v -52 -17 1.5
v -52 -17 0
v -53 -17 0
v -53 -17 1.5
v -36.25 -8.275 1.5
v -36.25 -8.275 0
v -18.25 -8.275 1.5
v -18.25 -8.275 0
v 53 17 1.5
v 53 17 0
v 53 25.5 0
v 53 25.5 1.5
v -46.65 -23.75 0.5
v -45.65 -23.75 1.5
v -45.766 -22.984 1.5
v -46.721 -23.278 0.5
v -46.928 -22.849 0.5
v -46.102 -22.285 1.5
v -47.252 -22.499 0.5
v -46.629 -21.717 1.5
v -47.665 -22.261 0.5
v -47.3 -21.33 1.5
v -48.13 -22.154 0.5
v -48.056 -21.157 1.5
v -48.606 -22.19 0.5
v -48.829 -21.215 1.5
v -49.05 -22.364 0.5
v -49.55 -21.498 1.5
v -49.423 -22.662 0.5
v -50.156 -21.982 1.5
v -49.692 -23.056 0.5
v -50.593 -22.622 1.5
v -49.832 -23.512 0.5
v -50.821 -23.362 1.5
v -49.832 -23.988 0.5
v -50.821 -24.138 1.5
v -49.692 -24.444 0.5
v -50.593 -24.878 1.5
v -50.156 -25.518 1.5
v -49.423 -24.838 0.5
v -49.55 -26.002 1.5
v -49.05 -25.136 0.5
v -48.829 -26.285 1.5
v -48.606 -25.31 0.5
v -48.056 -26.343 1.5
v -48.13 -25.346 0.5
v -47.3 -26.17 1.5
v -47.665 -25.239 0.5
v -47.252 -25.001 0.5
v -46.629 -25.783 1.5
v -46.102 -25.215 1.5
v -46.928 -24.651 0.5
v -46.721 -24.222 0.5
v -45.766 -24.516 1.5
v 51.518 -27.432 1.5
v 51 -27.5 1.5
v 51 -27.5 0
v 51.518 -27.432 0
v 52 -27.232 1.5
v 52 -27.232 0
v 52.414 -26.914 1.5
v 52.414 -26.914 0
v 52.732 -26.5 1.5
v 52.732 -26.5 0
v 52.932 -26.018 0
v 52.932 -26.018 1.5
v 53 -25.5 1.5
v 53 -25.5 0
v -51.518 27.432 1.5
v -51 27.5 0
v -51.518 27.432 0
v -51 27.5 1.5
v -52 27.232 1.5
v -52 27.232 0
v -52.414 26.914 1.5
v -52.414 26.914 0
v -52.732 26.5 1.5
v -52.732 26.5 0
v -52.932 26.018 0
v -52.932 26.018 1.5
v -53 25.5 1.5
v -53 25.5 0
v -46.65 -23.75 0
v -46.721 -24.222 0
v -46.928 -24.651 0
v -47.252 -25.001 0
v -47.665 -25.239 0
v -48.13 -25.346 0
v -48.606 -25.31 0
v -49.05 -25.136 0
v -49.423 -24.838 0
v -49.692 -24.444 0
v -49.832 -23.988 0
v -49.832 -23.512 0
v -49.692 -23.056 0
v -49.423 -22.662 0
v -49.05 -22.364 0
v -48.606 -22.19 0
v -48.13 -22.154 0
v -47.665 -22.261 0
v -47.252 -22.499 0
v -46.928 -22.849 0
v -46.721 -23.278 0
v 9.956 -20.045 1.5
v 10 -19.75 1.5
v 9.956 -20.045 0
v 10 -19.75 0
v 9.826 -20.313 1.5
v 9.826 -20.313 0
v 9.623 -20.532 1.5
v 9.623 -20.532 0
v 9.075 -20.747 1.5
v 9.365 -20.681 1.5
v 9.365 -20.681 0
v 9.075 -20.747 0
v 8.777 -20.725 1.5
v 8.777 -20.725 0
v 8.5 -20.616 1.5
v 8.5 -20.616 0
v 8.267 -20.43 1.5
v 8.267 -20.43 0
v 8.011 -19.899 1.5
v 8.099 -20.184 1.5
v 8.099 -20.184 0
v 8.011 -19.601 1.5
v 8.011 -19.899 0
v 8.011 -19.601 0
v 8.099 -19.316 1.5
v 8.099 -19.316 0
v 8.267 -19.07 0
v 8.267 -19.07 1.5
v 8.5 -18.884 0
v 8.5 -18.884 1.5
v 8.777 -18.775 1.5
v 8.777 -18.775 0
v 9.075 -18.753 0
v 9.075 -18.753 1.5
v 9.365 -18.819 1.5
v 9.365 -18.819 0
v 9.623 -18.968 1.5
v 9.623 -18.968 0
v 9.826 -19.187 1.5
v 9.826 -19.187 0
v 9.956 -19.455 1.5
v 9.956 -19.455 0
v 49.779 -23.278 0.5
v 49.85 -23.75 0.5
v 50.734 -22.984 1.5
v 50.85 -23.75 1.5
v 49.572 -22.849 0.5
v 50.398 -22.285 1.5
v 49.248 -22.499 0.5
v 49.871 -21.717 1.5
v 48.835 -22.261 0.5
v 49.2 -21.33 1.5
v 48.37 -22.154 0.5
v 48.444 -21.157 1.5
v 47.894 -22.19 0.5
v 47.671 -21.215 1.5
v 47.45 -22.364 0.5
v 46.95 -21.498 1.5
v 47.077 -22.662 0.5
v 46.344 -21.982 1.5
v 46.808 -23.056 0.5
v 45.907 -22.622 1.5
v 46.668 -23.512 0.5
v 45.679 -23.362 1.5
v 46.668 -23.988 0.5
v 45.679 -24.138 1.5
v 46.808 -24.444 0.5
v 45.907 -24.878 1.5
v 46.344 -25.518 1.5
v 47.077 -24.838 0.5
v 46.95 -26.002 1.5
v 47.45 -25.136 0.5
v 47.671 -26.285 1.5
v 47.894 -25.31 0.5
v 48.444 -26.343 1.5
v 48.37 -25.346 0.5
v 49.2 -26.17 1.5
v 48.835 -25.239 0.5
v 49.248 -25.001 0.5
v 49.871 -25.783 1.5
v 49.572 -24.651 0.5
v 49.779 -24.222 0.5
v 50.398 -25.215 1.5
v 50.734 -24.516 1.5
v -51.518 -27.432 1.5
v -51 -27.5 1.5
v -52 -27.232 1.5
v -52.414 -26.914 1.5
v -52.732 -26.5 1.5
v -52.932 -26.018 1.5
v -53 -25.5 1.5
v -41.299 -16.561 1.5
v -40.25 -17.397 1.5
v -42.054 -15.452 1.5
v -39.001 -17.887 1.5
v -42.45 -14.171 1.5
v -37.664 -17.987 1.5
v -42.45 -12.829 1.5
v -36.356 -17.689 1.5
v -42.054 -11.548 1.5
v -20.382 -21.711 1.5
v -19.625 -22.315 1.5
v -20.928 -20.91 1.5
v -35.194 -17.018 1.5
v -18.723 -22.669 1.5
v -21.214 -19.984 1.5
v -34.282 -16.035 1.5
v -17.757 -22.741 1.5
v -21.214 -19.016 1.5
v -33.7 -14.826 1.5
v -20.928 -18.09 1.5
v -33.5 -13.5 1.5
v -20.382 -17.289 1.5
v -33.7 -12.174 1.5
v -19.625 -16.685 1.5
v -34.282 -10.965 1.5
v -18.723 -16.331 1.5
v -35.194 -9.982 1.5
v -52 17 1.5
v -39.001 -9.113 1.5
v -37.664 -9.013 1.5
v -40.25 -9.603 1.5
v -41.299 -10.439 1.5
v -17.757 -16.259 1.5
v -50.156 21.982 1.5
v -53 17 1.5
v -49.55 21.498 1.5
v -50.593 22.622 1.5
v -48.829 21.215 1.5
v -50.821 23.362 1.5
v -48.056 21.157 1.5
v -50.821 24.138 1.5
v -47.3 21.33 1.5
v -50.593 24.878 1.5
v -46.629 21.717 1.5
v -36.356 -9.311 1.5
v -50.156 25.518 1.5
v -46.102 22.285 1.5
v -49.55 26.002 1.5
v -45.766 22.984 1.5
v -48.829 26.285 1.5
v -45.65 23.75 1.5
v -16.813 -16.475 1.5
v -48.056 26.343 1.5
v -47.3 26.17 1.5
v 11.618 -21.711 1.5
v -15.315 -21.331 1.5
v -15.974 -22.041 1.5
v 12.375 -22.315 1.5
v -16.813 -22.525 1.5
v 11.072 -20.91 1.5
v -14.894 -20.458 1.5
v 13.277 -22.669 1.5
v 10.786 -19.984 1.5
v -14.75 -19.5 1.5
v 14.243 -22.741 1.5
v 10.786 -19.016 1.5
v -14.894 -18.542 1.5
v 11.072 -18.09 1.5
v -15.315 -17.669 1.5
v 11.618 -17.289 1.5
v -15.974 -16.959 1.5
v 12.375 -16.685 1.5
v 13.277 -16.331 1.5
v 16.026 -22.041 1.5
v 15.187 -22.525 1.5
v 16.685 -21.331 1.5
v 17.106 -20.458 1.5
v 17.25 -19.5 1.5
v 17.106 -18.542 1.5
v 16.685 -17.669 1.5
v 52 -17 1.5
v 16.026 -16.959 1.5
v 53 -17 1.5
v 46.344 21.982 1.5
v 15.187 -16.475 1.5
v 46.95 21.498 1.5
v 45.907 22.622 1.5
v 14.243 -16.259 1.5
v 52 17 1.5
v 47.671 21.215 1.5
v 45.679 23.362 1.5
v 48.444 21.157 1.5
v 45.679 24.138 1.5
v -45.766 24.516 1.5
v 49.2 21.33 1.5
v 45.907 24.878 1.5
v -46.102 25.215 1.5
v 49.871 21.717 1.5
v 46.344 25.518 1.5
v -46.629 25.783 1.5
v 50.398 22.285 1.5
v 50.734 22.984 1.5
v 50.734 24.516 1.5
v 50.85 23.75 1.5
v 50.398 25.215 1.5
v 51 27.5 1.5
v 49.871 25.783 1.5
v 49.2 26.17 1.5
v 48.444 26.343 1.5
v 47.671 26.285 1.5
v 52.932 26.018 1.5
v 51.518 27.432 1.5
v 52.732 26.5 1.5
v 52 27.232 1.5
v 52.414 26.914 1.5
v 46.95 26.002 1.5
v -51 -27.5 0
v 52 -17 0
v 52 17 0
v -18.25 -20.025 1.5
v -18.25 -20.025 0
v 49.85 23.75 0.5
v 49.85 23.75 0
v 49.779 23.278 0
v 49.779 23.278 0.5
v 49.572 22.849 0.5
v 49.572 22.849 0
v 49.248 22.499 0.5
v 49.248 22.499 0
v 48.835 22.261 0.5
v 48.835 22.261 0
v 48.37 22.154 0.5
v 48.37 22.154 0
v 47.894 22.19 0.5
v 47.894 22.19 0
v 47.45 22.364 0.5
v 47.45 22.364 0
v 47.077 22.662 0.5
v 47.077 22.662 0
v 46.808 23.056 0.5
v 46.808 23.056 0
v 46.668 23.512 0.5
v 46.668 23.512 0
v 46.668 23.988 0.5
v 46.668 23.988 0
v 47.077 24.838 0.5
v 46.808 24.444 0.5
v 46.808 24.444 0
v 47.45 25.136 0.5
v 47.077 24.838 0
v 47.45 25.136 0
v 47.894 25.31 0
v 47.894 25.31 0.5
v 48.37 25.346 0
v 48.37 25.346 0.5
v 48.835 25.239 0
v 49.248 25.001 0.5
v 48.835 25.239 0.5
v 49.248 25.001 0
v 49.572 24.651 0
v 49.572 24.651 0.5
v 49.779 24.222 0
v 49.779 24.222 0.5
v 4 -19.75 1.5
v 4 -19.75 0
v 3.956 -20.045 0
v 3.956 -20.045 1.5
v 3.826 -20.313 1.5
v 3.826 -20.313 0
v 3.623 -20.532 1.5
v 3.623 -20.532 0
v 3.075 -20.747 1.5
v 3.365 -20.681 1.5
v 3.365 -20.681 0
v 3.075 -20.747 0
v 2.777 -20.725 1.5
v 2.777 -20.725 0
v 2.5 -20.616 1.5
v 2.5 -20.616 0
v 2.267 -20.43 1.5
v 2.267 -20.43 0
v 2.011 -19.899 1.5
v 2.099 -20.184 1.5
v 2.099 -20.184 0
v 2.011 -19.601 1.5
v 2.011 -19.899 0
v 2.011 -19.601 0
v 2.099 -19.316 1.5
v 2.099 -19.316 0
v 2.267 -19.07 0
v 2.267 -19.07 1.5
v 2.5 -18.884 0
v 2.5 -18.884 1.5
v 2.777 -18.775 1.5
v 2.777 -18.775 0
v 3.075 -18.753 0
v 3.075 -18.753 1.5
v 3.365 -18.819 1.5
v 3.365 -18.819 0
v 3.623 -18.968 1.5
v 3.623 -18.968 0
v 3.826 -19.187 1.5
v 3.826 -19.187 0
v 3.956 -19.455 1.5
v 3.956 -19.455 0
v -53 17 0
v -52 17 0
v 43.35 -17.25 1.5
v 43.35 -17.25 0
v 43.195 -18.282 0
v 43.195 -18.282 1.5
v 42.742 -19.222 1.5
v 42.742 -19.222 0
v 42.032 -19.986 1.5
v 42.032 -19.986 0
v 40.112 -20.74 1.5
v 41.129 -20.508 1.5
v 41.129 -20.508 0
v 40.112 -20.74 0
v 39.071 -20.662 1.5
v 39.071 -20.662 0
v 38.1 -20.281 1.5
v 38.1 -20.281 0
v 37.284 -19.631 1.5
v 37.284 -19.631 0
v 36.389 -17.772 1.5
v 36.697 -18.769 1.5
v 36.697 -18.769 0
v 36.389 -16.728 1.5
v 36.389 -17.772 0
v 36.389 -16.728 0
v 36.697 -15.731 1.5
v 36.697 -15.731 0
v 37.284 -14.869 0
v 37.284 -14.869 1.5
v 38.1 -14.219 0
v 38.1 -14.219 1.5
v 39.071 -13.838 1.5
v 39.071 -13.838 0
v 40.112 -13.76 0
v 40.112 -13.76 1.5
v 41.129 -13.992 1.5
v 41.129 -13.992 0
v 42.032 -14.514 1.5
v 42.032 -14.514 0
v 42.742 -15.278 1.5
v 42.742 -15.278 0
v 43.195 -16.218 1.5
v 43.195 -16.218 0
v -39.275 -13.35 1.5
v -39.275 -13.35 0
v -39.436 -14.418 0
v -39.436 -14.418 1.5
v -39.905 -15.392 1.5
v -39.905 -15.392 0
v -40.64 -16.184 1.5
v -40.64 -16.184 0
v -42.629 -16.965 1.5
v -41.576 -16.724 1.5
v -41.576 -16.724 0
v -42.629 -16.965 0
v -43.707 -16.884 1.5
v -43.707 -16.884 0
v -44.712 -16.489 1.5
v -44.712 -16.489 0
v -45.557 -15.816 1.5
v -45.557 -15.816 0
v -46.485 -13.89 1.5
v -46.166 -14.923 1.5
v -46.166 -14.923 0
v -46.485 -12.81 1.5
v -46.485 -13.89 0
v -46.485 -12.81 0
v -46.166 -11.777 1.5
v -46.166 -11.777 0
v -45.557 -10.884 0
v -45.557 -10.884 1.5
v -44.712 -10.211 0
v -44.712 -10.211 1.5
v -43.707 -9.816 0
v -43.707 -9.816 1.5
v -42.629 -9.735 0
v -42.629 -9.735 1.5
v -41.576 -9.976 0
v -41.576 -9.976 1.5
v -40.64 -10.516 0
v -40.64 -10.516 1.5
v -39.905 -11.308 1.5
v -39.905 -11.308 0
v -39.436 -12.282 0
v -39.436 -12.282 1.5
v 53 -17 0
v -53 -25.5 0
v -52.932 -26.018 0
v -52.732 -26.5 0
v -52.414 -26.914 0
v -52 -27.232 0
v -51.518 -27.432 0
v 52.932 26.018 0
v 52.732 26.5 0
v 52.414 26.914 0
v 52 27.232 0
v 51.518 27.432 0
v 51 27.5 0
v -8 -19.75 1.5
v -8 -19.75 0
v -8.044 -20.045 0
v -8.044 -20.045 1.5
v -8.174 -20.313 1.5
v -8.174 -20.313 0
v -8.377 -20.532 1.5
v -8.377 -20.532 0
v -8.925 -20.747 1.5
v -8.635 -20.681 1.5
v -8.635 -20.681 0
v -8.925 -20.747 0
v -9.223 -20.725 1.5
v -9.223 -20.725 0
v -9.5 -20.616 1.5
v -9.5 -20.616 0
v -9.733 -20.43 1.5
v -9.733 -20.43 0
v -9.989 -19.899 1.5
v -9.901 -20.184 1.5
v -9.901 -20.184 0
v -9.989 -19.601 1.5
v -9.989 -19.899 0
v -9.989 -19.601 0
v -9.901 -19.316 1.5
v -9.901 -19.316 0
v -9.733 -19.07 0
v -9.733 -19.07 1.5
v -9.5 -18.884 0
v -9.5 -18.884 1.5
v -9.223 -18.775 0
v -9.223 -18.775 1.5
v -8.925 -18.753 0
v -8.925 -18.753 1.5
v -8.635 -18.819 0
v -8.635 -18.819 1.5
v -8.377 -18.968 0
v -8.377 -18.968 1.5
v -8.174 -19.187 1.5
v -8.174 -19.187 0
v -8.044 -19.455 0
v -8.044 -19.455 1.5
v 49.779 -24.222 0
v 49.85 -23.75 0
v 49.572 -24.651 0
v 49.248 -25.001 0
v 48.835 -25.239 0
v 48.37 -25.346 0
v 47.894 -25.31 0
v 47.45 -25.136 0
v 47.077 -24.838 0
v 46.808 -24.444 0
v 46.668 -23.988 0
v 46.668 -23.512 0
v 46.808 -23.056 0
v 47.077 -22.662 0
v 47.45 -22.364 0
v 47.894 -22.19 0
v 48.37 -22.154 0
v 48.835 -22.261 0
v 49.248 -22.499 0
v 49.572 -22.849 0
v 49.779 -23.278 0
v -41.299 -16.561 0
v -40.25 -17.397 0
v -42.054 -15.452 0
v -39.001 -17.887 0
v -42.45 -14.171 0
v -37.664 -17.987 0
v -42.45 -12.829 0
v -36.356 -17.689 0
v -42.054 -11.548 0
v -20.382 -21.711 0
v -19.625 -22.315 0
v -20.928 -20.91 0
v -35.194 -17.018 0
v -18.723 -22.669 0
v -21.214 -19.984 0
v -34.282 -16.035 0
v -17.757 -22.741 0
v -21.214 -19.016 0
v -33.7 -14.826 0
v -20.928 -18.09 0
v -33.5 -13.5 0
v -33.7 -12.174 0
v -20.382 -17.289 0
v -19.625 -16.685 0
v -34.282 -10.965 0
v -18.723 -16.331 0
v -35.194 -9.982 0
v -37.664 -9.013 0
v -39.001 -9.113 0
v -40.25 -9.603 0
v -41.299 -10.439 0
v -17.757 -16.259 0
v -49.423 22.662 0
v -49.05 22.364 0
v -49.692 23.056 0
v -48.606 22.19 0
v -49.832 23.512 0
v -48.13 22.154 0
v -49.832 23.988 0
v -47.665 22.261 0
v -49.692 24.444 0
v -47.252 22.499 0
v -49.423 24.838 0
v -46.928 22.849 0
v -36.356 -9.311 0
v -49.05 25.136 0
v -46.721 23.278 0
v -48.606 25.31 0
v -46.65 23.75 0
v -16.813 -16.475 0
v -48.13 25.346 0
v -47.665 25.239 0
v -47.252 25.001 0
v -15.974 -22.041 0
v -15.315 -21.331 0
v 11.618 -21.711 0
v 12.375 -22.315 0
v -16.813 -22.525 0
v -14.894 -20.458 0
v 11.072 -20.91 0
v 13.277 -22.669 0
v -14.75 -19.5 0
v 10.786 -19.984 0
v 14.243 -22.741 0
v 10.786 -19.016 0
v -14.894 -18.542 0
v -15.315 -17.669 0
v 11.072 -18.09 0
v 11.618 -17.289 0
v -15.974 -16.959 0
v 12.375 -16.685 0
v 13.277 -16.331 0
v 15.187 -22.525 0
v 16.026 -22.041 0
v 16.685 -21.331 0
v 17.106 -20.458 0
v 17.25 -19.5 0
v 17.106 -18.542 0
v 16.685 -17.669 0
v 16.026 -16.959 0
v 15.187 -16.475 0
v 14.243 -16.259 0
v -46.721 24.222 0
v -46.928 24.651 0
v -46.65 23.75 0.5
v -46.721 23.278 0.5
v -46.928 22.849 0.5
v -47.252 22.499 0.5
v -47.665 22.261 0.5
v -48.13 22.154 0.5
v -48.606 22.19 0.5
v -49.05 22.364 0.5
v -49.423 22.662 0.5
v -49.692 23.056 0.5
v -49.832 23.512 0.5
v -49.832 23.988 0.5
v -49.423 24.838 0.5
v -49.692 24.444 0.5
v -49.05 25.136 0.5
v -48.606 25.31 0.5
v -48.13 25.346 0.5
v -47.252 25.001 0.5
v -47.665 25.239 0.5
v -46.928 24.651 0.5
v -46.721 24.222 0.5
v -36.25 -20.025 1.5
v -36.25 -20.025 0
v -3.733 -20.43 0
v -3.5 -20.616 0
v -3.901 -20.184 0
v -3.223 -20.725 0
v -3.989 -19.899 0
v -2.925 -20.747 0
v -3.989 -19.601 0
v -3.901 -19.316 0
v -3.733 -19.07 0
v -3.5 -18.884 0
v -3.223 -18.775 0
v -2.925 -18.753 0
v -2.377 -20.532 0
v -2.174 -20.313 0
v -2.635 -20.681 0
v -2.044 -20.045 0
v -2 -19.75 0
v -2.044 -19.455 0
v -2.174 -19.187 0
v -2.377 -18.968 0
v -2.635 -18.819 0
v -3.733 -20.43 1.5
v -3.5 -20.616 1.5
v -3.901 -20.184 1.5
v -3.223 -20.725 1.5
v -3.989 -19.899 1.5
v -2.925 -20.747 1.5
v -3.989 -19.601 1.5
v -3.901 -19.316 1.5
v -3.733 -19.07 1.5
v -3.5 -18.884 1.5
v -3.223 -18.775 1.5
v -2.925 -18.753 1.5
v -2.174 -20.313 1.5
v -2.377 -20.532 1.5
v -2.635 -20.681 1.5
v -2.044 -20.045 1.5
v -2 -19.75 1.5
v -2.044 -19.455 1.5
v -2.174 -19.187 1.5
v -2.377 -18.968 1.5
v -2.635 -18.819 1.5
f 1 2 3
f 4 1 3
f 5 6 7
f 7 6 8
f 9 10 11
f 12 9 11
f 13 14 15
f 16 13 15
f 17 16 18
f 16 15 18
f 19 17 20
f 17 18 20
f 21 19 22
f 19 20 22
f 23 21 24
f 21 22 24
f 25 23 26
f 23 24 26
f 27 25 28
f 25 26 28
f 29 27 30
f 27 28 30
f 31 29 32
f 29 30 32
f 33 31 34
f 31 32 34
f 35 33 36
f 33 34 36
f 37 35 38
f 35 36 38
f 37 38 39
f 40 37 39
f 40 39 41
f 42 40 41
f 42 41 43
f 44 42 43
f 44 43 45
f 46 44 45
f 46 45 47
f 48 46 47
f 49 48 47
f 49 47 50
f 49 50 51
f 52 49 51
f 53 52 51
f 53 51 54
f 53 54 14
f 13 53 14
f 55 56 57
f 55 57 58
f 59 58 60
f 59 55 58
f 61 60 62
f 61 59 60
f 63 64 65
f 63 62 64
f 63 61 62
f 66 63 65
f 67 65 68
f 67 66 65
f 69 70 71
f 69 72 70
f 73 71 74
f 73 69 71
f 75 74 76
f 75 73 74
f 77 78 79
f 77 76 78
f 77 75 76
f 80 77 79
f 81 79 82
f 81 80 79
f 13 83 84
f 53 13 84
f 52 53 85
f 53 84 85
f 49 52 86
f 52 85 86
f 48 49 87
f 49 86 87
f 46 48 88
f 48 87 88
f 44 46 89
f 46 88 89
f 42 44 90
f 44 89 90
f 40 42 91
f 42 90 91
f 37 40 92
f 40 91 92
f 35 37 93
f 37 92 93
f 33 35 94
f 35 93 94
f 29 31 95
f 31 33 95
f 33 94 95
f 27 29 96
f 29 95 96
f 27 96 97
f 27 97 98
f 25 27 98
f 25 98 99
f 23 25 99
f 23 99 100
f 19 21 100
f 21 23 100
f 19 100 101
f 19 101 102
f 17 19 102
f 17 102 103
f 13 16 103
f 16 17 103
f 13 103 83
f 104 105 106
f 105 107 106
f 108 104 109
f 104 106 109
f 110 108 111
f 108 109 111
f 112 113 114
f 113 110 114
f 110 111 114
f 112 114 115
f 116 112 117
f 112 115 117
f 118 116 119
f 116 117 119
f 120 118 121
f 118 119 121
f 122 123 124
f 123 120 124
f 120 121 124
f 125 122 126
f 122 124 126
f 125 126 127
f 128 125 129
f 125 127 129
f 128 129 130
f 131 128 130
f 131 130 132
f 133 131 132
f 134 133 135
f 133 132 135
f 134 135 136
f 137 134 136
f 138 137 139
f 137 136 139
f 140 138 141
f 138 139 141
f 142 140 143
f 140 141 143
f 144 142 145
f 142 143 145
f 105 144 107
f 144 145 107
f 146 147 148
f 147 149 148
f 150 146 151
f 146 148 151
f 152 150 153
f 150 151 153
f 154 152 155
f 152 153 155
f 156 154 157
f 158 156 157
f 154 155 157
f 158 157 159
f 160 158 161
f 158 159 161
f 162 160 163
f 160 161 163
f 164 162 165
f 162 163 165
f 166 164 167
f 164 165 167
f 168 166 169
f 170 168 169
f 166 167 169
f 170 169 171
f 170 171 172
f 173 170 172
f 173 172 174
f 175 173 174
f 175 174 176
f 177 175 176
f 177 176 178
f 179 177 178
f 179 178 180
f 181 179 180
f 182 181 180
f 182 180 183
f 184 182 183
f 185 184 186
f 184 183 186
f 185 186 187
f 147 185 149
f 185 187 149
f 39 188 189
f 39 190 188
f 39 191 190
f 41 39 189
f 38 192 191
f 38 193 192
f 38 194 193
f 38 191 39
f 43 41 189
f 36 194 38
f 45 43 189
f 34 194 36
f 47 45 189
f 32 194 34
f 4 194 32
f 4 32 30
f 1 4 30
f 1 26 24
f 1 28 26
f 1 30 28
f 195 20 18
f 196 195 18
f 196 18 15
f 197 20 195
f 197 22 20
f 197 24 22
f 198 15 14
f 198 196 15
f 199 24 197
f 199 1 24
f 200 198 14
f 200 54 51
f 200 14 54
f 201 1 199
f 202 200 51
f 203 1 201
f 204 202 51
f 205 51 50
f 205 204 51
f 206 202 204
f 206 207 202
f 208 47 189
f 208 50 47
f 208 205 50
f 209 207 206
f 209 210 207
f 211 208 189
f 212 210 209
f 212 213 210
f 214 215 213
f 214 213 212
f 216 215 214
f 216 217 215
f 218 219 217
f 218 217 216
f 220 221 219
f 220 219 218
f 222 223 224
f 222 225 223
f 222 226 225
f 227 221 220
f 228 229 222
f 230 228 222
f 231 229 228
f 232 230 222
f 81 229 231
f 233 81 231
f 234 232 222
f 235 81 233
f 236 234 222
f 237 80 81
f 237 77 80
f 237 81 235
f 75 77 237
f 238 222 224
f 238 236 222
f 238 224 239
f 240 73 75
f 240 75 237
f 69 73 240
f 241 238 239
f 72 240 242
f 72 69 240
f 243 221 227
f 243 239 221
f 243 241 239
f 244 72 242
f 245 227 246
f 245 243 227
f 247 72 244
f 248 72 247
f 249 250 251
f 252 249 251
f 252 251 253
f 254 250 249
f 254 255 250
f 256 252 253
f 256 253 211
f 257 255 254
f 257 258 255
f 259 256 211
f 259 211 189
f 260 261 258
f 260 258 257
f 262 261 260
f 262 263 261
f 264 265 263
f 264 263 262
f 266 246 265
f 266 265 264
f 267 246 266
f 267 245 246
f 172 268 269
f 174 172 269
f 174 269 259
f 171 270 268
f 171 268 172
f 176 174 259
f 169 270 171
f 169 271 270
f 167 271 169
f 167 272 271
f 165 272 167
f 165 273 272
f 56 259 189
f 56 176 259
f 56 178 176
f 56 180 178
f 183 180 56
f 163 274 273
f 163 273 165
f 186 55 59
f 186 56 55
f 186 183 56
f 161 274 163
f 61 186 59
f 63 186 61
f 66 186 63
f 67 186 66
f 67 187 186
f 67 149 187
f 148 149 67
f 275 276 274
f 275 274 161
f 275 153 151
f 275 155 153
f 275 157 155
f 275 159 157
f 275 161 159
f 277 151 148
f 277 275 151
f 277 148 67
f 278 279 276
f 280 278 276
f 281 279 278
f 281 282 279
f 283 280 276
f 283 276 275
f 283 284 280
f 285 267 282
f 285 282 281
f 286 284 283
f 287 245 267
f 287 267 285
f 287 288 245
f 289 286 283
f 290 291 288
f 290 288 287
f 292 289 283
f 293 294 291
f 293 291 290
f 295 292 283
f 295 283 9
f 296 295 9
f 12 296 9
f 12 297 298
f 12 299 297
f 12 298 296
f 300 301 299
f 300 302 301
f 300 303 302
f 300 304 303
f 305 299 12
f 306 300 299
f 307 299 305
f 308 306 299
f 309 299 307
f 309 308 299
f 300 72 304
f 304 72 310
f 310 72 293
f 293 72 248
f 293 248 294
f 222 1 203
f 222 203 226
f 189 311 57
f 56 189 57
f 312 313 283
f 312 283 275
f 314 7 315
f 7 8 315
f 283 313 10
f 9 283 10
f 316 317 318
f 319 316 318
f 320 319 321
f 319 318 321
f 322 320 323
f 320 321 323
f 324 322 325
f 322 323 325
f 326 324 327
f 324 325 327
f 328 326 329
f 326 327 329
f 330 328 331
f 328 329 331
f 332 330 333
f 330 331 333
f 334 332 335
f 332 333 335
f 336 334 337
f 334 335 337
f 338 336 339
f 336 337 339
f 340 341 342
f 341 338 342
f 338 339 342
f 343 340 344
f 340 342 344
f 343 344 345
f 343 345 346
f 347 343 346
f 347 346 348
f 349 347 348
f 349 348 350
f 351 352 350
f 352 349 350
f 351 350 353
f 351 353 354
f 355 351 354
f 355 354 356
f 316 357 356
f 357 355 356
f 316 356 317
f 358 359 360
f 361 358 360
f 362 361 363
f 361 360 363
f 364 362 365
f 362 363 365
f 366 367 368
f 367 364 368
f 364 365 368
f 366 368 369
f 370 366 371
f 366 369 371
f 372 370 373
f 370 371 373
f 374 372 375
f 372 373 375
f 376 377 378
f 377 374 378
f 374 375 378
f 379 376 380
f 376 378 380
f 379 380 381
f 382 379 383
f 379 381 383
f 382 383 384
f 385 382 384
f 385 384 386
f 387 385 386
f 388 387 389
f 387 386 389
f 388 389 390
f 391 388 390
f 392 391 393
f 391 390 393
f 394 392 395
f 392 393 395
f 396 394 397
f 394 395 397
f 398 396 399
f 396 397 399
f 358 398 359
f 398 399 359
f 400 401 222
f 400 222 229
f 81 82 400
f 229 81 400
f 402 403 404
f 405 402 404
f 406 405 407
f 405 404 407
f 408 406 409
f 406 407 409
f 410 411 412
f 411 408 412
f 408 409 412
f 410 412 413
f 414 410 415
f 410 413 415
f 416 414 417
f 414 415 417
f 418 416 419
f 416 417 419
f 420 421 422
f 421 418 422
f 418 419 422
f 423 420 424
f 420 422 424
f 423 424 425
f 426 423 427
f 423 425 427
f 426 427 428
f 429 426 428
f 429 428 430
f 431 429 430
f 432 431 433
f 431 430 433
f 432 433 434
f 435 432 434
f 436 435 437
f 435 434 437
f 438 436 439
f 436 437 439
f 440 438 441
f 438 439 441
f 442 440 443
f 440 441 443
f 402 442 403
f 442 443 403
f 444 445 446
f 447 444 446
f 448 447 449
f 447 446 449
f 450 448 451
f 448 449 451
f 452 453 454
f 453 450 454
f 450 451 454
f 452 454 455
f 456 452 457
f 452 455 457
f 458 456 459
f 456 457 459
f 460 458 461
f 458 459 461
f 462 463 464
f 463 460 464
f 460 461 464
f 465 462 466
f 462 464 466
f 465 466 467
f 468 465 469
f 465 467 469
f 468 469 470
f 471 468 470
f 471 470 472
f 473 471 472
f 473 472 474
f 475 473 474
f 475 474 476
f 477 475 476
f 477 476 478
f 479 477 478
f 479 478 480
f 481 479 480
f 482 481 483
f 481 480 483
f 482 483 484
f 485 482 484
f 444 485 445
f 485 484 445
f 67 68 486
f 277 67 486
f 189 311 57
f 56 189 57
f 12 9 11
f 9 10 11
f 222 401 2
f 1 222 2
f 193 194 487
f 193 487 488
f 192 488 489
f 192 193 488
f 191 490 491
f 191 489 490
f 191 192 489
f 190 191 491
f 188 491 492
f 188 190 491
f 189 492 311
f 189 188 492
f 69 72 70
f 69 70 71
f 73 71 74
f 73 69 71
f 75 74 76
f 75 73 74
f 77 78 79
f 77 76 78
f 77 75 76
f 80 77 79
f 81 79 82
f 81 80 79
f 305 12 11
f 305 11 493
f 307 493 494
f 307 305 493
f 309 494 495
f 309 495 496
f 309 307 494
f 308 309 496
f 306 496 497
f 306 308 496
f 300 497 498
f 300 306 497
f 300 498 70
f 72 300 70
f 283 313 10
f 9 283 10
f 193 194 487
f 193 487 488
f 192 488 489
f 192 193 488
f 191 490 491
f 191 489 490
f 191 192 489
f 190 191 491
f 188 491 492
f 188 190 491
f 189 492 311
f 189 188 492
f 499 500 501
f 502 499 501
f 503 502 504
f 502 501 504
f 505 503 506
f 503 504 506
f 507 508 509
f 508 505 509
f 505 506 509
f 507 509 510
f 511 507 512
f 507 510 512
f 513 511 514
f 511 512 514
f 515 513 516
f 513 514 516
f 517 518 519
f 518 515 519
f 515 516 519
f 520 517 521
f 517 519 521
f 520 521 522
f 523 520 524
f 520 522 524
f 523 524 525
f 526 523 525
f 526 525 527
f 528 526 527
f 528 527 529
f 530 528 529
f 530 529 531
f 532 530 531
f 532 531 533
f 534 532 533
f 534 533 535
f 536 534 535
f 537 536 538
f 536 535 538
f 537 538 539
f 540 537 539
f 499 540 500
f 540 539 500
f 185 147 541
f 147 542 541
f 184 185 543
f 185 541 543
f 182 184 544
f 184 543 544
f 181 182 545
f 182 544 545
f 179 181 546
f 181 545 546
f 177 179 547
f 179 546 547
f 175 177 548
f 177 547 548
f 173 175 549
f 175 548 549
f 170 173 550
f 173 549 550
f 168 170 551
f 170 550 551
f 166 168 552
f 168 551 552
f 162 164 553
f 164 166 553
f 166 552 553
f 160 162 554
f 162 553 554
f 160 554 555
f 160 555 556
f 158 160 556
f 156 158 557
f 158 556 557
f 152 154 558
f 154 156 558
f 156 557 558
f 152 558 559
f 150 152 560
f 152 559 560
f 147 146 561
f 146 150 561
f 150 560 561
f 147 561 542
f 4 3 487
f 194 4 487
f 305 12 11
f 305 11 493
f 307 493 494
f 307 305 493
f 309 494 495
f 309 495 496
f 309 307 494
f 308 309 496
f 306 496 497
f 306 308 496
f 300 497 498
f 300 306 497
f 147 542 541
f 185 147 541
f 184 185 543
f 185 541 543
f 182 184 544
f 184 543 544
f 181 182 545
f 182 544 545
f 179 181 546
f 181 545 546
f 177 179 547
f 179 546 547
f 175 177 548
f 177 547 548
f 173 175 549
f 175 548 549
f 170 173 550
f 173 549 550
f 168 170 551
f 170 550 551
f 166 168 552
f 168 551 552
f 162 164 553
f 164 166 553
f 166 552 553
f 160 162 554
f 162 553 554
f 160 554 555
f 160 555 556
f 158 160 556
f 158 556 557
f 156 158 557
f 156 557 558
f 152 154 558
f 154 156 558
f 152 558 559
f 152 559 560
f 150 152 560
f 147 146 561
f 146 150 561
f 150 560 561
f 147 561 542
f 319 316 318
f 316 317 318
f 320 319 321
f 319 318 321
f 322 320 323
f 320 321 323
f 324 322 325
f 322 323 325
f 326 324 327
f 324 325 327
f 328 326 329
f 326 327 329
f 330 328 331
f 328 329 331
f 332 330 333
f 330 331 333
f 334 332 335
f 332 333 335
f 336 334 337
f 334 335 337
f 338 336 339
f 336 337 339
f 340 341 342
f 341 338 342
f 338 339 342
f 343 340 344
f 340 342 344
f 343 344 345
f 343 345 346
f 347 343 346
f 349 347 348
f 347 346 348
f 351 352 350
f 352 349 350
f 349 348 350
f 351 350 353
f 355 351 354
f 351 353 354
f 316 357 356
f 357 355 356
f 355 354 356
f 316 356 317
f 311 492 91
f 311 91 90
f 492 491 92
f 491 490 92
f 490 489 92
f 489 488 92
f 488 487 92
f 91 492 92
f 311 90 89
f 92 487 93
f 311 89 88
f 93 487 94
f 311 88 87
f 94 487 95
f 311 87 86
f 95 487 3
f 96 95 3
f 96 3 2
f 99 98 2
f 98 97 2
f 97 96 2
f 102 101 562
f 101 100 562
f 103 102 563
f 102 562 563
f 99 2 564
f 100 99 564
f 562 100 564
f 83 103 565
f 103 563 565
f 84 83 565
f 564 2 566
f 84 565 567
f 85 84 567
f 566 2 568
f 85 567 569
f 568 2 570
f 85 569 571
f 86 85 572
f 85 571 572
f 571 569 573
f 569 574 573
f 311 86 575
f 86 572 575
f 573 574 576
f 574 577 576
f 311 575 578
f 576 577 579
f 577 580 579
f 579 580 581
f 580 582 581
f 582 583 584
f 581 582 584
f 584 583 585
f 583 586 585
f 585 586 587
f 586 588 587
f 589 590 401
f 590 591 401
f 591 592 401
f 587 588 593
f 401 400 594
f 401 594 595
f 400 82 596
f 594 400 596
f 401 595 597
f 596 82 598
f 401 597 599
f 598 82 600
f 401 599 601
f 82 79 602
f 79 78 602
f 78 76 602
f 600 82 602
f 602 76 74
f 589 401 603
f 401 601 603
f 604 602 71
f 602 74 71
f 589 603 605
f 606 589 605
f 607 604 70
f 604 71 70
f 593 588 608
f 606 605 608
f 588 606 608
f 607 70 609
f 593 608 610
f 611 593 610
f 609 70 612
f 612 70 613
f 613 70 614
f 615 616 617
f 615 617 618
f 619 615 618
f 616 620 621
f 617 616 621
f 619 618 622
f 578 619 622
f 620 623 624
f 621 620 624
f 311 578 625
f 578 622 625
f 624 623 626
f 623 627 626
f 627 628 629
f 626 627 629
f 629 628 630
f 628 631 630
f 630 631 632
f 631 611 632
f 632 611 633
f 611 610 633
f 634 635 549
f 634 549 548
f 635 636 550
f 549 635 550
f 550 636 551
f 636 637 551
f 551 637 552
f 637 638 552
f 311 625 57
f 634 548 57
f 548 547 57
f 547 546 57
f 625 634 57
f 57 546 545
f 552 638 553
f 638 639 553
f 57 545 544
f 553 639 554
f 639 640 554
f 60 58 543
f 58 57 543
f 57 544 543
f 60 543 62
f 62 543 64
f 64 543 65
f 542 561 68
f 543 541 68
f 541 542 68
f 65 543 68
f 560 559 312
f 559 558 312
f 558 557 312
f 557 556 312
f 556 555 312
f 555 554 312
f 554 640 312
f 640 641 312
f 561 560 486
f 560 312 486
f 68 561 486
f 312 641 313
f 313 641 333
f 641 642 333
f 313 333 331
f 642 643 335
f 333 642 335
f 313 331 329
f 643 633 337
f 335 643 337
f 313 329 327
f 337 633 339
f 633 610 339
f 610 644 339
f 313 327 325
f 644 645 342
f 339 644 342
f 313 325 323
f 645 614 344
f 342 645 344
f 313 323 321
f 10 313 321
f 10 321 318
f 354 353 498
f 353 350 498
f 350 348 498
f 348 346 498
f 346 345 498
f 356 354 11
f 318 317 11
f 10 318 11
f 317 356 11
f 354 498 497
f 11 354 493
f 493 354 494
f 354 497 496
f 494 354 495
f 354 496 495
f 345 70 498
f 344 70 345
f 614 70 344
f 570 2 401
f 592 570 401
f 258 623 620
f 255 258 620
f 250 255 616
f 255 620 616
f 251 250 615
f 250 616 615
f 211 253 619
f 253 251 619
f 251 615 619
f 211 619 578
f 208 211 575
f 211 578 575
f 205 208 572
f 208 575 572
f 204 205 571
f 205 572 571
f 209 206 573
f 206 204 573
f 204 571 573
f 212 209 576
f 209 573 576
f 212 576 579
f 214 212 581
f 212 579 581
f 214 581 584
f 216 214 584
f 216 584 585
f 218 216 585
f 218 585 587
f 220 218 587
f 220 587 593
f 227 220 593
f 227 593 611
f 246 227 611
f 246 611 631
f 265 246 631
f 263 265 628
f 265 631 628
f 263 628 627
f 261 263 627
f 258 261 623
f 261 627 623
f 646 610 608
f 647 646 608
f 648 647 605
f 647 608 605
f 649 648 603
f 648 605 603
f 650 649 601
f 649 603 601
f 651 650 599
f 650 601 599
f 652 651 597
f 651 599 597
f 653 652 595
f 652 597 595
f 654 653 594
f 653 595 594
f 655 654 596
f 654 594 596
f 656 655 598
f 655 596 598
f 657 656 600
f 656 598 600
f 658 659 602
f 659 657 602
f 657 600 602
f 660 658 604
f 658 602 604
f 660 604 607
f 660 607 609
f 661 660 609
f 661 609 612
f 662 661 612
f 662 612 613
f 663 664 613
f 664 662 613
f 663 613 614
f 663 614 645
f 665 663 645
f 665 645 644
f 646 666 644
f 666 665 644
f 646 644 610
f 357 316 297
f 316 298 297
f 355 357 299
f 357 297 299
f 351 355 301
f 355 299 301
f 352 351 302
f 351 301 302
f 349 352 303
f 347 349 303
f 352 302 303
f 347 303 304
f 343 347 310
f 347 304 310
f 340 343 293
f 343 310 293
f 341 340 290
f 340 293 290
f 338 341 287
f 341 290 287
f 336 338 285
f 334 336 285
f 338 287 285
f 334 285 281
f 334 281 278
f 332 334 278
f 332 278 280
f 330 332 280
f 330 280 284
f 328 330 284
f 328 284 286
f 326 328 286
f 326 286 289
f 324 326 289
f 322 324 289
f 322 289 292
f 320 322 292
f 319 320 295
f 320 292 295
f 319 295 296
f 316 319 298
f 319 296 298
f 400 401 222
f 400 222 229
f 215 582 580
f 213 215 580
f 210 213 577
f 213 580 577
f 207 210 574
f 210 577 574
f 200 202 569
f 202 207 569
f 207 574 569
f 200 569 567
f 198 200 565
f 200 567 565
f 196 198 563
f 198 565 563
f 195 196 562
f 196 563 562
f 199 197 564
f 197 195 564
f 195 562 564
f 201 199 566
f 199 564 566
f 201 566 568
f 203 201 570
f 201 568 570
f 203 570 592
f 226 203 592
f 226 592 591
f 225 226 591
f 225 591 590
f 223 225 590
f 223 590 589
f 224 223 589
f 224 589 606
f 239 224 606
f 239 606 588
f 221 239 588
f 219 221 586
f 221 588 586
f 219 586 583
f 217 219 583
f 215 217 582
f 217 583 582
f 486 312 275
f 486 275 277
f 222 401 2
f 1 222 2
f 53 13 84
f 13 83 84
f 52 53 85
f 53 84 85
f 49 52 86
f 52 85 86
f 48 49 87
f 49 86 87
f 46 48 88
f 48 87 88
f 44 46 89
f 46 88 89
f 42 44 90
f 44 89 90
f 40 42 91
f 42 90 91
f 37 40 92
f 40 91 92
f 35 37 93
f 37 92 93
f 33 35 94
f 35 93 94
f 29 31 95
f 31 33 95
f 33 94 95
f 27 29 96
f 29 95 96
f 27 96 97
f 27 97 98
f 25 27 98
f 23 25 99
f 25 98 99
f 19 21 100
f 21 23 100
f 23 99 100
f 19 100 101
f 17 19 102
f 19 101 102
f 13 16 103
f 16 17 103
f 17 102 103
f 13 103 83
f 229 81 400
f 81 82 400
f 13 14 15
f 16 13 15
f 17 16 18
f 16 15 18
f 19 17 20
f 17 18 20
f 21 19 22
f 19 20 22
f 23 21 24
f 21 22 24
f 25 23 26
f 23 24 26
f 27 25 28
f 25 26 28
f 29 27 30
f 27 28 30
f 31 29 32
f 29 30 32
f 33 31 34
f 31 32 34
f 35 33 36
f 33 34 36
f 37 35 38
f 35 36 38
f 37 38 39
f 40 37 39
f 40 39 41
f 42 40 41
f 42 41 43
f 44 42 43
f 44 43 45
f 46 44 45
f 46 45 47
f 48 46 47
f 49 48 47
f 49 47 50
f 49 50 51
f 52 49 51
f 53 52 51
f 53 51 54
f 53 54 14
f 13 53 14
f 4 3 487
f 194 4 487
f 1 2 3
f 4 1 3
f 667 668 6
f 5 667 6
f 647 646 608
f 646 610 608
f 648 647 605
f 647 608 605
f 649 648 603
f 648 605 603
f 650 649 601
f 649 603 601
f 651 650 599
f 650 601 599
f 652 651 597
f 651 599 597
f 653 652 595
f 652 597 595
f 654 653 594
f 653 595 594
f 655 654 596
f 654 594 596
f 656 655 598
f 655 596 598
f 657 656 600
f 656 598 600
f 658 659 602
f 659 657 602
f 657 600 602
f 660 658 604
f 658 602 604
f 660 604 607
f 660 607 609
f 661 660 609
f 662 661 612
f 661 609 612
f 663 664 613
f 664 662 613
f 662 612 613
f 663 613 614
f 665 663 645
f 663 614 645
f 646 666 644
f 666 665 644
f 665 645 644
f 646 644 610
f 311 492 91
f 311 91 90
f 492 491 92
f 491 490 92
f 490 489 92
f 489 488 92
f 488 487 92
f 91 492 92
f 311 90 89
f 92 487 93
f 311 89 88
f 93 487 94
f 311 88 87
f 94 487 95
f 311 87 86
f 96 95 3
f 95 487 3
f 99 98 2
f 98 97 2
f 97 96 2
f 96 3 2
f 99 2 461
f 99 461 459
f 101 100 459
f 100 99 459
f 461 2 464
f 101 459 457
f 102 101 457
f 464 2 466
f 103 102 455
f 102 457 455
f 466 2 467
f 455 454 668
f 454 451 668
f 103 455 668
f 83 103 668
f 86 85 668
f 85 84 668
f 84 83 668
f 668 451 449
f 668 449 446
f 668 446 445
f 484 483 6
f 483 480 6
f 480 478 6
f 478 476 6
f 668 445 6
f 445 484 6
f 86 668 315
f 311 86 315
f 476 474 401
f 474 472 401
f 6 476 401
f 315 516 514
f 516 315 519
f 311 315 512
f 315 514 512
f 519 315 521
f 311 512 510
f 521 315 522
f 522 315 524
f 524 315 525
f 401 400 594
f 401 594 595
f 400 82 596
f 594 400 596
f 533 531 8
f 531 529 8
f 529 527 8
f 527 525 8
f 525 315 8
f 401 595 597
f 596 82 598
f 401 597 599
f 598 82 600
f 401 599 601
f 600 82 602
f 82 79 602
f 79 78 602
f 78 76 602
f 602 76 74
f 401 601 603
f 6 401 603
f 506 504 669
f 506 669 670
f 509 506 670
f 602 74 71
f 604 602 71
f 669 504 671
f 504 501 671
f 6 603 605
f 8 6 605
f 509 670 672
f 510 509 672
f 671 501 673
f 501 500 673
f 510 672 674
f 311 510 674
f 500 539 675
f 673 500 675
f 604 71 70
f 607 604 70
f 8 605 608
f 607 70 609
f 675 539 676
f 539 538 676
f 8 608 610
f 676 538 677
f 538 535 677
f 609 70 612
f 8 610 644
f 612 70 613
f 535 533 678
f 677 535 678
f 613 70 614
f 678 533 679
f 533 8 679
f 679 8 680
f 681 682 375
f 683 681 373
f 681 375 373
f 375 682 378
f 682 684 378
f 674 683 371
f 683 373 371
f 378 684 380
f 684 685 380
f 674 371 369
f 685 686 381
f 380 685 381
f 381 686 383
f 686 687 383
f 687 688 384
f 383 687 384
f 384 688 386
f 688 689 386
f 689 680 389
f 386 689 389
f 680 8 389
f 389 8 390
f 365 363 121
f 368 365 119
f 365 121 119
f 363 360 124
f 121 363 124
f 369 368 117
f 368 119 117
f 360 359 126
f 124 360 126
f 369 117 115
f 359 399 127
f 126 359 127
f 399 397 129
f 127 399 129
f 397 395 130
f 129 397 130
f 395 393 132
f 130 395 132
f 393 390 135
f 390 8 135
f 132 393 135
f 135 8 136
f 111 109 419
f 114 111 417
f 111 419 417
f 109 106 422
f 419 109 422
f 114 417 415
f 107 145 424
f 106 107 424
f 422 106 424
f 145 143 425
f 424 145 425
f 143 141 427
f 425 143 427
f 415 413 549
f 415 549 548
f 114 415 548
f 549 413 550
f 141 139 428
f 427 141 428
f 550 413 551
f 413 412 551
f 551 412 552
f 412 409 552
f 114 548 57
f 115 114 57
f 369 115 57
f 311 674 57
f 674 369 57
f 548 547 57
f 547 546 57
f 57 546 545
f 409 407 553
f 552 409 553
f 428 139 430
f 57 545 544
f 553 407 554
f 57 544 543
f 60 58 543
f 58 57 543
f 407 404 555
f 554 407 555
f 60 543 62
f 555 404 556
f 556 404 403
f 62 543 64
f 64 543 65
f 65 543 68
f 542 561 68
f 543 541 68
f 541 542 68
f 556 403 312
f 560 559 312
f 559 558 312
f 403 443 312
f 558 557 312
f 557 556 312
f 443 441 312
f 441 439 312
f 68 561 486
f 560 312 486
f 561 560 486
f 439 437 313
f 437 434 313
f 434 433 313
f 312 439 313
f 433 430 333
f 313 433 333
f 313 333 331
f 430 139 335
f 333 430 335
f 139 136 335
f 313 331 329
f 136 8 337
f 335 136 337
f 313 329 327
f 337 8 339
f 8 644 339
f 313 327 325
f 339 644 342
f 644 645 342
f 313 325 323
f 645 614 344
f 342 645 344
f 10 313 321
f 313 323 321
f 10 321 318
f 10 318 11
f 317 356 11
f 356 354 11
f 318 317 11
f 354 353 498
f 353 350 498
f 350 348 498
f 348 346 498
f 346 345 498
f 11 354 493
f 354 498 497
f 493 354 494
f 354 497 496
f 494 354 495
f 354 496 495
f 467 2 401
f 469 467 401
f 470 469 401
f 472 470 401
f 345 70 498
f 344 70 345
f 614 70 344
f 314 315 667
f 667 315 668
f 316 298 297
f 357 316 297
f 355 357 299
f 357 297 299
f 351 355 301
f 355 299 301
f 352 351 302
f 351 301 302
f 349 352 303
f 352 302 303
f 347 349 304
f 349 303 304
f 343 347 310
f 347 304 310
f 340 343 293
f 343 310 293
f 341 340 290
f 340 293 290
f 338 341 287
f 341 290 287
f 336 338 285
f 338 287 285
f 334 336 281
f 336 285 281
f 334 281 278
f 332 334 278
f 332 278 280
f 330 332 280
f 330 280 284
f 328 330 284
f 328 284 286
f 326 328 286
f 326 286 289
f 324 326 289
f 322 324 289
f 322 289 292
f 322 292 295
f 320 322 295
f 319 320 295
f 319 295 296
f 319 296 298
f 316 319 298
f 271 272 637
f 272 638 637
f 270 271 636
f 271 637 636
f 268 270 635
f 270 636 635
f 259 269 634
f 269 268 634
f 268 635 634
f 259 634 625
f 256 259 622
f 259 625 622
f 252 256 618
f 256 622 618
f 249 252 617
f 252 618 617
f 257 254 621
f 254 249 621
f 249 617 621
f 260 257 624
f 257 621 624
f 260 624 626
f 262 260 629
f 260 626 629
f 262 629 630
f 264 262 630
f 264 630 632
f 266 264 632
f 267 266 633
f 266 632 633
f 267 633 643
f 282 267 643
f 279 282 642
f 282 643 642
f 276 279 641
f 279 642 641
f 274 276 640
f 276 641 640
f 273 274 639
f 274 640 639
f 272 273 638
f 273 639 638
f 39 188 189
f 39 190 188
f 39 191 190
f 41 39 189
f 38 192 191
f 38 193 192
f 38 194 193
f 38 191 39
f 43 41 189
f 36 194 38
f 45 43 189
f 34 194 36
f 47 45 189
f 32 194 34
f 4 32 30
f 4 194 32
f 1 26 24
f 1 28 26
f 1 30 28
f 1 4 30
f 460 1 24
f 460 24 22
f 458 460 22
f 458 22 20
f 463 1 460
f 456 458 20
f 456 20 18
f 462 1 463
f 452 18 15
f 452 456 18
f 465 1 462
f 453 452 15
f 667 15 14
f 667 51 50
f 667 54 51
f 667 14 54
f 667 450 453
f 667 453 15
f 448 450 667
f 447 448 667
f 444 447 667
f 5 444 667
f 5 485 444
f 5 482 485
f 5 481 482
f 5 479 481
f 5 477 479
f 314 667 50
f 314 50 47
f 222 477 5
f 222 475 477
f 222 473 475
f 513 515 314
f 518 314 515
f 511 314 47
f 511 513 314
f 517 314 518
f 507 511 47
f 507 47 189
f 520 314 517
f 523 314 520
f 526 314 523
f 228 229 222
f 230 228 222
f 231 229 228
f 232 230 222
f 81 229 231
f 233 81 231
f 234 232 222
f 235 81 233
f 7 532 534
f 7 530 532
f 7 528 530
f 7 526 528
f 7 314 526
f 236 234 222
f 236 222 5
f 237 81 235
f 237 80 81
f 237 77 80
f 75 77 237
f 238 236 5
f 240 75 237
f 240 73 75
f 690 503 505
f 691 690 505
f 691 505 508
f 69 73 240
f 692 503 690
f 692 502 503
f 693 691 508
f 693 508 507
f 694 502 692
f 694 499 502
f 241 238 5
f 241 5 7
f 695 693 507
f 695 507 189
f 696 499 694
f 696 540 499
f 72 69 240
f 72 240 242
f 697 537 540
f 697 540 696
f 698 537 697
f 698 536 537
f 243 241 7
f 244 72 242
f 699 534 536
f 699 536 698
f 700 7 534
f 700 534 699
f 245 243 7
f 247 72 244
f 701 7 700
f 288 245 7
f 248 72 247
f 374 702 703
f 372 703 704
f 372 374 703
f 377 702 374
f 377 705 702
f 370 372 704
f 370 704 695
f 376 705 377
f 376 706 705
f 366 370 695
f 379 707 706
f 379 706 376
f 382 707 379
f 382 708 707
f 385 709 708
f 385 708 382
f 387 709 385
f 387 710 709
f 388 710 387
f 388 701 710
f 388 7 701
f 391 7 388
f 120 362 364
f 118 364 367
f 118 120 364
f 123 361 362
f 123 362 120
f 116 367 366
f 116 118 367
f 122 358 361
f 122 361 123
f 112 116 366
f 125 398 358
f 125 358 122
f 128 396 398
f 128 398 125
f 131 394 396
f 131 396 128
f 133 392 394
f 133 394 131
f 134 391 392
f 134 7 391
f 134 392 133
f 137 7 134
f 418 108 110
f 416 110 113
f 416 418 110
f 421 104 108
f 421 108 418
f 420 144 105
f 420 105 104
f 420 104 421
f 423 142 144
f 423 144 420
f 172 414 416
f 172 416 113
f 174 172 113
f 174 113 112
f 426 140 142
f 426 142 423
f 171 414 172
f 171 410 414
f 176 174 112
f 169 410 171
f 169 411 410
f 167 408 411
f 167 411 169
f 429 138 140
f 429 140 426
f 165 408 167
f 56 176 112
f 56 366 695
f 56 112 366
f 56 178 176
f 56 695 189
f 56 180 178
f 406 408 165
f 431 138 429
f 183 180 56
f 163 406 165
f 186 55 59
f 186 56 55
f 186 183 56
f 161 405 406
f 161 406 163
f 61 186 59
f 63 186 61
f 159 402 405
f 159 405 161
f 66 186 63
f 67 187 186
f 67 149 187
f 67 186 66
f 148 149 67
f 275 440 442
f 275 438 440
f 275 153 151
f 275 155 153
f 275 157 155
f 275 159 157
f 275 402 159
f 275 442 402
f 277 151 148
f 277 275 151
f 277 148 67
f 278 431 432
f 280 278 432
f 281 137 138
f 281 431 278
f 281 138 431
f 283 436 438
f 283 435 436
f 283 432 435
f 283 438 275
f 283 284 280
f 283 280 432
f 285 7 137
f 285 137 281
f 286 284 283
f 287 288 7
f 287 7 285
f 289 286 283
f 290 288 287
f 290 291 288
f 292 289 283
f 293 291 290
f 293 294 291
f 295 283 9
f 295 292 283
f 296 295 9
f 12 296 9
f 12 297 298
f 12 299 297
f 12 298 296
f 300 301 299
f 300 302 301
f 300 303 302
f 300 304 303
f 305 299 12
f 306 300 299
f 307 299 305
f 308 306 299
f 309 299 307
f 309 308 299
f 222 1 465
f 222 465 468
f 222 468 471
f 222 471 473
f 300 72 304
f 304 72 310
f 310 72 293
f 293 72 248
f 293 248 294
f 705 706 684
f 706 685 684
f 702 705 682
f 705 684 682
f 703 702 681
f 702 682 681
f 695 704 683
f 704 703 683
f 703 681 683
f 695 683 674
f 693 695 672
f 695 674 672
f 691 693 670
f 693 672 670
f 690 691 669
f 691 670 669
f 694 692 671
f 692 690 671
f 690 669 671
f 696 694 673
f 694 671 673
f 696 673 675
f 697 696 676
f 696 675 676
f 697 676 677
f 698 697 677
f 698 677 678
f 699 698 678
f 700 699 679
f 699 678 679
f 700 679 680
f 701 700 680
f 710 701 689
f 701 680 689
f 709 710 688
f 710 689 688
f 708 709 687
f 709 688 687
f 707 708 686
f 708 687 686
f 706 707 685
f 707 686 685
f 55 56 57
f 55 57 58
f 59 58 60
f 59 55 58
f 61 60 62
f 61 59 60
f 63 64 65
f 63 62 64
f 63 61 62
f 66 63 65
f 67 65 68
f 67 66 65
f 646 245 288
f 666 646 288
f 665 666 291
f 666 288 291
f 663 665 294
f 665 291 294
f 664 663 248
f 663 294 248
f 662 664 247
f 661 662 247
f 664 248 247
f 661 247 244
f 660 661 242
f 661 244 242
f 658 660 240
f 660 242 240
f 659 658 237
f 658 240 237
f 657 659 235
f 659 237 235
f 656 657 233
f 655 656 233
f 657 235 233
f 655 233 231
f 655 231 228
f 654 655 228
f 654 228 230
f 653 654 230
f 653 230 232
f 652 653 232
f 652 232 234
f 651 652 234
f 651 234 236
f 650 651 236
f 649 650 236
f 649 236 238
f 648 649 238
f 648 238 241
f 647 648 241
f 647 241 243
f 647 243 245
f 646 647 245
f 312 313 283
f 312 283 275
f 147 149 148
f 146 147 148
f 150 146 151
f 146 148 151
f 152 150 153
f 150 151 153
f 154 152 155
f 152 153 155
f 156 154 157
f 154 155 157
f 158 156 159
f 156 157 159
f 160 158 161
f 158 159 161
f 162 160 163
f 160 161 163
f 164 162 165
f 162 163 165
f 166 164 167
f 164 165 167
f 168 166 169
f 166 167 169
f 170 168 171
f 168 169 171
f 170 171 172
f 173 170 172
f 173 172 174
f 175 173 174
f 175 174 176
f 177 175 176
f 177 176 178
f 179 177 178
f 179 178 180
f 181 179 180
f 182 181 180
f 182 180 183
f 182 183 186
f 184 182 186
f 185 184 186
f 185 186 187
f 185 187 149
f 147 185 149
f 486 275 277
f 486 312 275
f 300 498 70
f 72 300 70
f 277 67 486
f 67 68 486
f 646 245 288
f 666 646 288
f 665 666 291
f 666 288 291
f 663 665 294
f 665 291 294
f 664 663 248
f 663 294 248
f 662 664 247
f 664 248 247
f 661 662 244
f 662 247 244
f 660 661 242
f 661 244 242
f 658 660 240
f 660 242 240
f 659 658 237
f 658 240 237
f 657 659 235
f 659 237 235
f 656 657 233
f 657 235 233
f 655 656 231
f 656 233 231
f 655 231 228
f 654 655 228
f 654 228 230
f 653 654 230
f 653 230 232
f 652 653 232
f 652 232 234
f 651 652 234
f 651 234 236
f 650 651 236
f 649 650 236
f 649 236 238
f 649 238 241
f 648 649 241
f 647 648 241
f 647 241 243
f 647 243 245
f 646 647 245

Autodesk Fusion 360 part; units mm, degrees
sketch "Sketch1" plane through (0, 0, 0) normal (0, 0, 1) x (1, 0, 0) in component "Front Cover"
  line L0 (53, 27.5) -> (-53, 27.5)
  line L1 (-53, 27.5) -> (-53, -27.5)
  line L2 (-53, -27.5) -> (53, -27.5)
  line L3 (53, -27.5) -> (53, 27.5)
  line L4 (53, 27.5) -> (-53, -27.5) construction
  line L5 (-53, 27.5) -> (53, -27.5) construction
  line L6 (48.25, 23.75) -> (-48.25, 23.75) construction
  line L7 (-48.25, 23.75) -> (-48.25, -23.75) construction
  line L8 (-48.25, -23.75) -> (48.25, -23.75) construction
  line L9 (48.25, -23.75) -> (48.25, 23.75) construction
  line L10 (48.25, 23.75) -> (-48.25, -23.75) construction
  line L11 (-48.25, 23.75) -> (48.25, -23.75) construction
  circle A0 centre (-48.25, 23.75) radius 1.6
  circle A1 centre (48.25, 23.75) radius 1.6
  circle A2 centre (48.25, -23.75) radius 1.6
  circle A3 centre (-48.25, -23.75) radius 1.6
  line L12 (-53, 0) -> (53, 0) construction
  line L13 (-52, 17) -> (-52, -17)
  line L14 (-52, 17) -> (-53, 17)
  line L15 (-52, -17) -> (-53, -17)
  line L16 (52, 17) -> (52, -17)
  line L17 (52, 17) -> (53, 17)
  line L18 (52, -17) -> (53, -17)
  circle A4 centre (-42.9, -13.35) radius 3.625
  circle A5 centre (39.85, -17.25) radius 3.5
  circle A6 centre (-9, -19.75) radius 1
  circle A7 centre (-3, -19.75) radius 1
  circle A8 centre (3, -19.75) radius 1
  circle A9 centre (9, -19.75) radius 1
  line L19 (-18.25, -20.025) -> (-36.25, -20.025)
  line L20 (-36.25, -20.025) -> (-36.25, -8.275)
  line L21 (-36.25, -8.275) -> (-18.25, -8.275)
  line L22 (-18.25, -8.275) -> (-18.25, -20.025)
  line L23 (-18.25, -20.025) -> (-36.25, -8.275) construction
  line L24 (-36.25, -20.025) -> (-18.25, -8.275) construction
  point P0 (0, -27.5)
  point P1 (-52, 0)
  point P2 (52, 0)
  point P3 (-42.9, -13.35)
  point P4 (39.85, -17.25)
  point P5 (-9, -19.75)
  point P6 (-3, -19.75)
  point P7 (3, -19.75)
  point P8 (9, -19.75)
  point P9 (-27.25, -14.15)
  dimension "d1" = 106
  dimension "d2" = 55
  dimension "d5" = 96.5
  dimension "d6" = 47.5
  dimension "d7" = 3.2
  dimension "d10" = 34
  dimension "d11" = 1
  dimension "d12" = 34
  dimension "d13" = 1
  dimension "d16" = 14.15
  dimension "d17" = 10.1
  dimension "d18" = 7.25
  dimension "d25" = 10.25
  dimension "d26" = 13.15
  dimension "d27" = 7
  dimension "d33" = 7.75
  dimension "d34" = 44
  dimension "d35" = 6
  dimension "d36" = 6
  dimension "d37" = 12
  dimension "d38" = 6
  dimension "d39" = 2
  dimension "d49" = 18
  dimension "d50" = 11.75
  dimension "d51" = 13.35
  dimension "d52" = 25.75
extrude "Extrude5" add sketch "Sketch1" along normal blind 1.5 contours L0 L1 L2 L3 L13 L14 L15 L16 L17 L18 makes body 1 in component "Front Cover"
fillet "Fillet2" radius 2 4 edges at (-53, -27.5, 0.75) (-53, 27.5, 0.75) (53, 27.5, 0.75) (53, -27.5, 0.75) on bodies 1 in component "Front Cover"
chamfer "Chamfer3" distance 1 angle 45 4 edges at (-49.7417, -23.1714, 1.5) (-49.7417, 24.3286, 1.5) (46.7583, 24.3286, 1.5) (46.7583, -23.1714, 1.5) on bodies 1 in component "Front Cover"
sketch "Sketch1 (2)" plane through (0, 0, 0) normal (0, 0, 1) x (1, 0, 0) in component "Rear Cover"
  line L0 (53, 27.5) -> (-53, 27.5)
  line L1 (-53, 27.5) -> (-53, -27.5)
  line L2 (-53, -27.5) -> (53, -27.5)
  line L3 (53, -27.5) -> (53, 27.5)
  line L4 (53, 27.5) -> (-53, -27.5) construction
  line L5 (-53, 27.5) -> (53, -27.5) construction
  line L6 (48.25, 23.75) -> (-48.25, 23.75) construction
  line L7 (-48.25, 23.75) -> (-48.25, -23.75) construction
  line L8 (-48.25, -23.75) -> (48.25, -23.75) construction
  line L9 (48.25, -23.75) -> (48.25, 23.75) construction
  line L10 (48.25, 23.75) -> (-48.25, -23.75) construction
  line L11 (-48.25, 23.75) -> (48.25, -23.75) construction
  circle A0 centre (-48.25, 23.75) radius 1.6
  circle A1 centre (48.25, 23.75) radius 1.6
  circle A2 centre (48.25, -23.75) radius 1.6
  circle A3 centre (-48.25, -23.75) radius 1.6
  line L12 (-53, 0) -> (53, 0) construction
  line L13 (-52, 17) -> (-52, -17)
  line L14 (-52, 17) -> (-53, 17)
  line L15 (-52, -17) -> (-53, -17)
  line L16 (52, 17) -> (52, -17)
  line L17 (52, 17) -> (53, 17)
  line L18 (52, -17) -> (53, -17)
  circle A4 centre (-38, -13.5) radius 4.5
  circle A5 centre (-18, -19.5) radius 3.25
  circle A6 centre (14, -19.5) radius 3.25
  point P0 (0, -27.5)
  point P1 (-52, 0)
  point P2 (52, 0)
  dimension "d1_1" = 106
  dimension "d2_1" = 55
  dimension "d5_1" = 96.5
  dimension "d6_1" = 47.5
  dimension "d7_1" = 3.2
  dimension "d10_1" = 34
  dimension "d11_1" = 1
  dimension "d12_1" = 34
  dimension "d13_1" = 1
  dimension "d53" = 15
  dimension "d54" = 14
  dimension "d55" = 9
  dimension "d56" = 6.5
  dimension "d57" = 35
  dimension "d58" = 8
  dimension "d59" = 67
extrude "Extrude5'" add sketch "Sketch1 (2)" along normal blind 1.5 separate body contours L0 L1 L2 L3 L13 L14 L15 L16 L17 L18 makes body 2 in component "Rear Cover"
fillet "Fillet2'" radius 2 4 edges at (-53, -27.5, 0.75) (-53, 27.5, 0.75) (53, 27.5, 0.75) (53, -27.5, 0.75) on bodies 2 in component "Rear Cover"
chamfer "Chamfer3'" distance 1 angle 45 4 edges at (-49.7417, -23.1714, 1.5) (-49.7417, 24.3286, 1.5) (46.7583, 24.3286, 1.5) (46.7583, -23.1714, 1.5) on bodies 2 in component "Rear Cover"
component "Front Cover" placed x (1, 0, 0) y (0, 1, 0) z (0, 0, 1) at (0, 0, 0)
component "Rear Cover" placed x (1, 0, 0) y (0, 1, 0) z (0, 0, 1) at (0, 0, 0)
